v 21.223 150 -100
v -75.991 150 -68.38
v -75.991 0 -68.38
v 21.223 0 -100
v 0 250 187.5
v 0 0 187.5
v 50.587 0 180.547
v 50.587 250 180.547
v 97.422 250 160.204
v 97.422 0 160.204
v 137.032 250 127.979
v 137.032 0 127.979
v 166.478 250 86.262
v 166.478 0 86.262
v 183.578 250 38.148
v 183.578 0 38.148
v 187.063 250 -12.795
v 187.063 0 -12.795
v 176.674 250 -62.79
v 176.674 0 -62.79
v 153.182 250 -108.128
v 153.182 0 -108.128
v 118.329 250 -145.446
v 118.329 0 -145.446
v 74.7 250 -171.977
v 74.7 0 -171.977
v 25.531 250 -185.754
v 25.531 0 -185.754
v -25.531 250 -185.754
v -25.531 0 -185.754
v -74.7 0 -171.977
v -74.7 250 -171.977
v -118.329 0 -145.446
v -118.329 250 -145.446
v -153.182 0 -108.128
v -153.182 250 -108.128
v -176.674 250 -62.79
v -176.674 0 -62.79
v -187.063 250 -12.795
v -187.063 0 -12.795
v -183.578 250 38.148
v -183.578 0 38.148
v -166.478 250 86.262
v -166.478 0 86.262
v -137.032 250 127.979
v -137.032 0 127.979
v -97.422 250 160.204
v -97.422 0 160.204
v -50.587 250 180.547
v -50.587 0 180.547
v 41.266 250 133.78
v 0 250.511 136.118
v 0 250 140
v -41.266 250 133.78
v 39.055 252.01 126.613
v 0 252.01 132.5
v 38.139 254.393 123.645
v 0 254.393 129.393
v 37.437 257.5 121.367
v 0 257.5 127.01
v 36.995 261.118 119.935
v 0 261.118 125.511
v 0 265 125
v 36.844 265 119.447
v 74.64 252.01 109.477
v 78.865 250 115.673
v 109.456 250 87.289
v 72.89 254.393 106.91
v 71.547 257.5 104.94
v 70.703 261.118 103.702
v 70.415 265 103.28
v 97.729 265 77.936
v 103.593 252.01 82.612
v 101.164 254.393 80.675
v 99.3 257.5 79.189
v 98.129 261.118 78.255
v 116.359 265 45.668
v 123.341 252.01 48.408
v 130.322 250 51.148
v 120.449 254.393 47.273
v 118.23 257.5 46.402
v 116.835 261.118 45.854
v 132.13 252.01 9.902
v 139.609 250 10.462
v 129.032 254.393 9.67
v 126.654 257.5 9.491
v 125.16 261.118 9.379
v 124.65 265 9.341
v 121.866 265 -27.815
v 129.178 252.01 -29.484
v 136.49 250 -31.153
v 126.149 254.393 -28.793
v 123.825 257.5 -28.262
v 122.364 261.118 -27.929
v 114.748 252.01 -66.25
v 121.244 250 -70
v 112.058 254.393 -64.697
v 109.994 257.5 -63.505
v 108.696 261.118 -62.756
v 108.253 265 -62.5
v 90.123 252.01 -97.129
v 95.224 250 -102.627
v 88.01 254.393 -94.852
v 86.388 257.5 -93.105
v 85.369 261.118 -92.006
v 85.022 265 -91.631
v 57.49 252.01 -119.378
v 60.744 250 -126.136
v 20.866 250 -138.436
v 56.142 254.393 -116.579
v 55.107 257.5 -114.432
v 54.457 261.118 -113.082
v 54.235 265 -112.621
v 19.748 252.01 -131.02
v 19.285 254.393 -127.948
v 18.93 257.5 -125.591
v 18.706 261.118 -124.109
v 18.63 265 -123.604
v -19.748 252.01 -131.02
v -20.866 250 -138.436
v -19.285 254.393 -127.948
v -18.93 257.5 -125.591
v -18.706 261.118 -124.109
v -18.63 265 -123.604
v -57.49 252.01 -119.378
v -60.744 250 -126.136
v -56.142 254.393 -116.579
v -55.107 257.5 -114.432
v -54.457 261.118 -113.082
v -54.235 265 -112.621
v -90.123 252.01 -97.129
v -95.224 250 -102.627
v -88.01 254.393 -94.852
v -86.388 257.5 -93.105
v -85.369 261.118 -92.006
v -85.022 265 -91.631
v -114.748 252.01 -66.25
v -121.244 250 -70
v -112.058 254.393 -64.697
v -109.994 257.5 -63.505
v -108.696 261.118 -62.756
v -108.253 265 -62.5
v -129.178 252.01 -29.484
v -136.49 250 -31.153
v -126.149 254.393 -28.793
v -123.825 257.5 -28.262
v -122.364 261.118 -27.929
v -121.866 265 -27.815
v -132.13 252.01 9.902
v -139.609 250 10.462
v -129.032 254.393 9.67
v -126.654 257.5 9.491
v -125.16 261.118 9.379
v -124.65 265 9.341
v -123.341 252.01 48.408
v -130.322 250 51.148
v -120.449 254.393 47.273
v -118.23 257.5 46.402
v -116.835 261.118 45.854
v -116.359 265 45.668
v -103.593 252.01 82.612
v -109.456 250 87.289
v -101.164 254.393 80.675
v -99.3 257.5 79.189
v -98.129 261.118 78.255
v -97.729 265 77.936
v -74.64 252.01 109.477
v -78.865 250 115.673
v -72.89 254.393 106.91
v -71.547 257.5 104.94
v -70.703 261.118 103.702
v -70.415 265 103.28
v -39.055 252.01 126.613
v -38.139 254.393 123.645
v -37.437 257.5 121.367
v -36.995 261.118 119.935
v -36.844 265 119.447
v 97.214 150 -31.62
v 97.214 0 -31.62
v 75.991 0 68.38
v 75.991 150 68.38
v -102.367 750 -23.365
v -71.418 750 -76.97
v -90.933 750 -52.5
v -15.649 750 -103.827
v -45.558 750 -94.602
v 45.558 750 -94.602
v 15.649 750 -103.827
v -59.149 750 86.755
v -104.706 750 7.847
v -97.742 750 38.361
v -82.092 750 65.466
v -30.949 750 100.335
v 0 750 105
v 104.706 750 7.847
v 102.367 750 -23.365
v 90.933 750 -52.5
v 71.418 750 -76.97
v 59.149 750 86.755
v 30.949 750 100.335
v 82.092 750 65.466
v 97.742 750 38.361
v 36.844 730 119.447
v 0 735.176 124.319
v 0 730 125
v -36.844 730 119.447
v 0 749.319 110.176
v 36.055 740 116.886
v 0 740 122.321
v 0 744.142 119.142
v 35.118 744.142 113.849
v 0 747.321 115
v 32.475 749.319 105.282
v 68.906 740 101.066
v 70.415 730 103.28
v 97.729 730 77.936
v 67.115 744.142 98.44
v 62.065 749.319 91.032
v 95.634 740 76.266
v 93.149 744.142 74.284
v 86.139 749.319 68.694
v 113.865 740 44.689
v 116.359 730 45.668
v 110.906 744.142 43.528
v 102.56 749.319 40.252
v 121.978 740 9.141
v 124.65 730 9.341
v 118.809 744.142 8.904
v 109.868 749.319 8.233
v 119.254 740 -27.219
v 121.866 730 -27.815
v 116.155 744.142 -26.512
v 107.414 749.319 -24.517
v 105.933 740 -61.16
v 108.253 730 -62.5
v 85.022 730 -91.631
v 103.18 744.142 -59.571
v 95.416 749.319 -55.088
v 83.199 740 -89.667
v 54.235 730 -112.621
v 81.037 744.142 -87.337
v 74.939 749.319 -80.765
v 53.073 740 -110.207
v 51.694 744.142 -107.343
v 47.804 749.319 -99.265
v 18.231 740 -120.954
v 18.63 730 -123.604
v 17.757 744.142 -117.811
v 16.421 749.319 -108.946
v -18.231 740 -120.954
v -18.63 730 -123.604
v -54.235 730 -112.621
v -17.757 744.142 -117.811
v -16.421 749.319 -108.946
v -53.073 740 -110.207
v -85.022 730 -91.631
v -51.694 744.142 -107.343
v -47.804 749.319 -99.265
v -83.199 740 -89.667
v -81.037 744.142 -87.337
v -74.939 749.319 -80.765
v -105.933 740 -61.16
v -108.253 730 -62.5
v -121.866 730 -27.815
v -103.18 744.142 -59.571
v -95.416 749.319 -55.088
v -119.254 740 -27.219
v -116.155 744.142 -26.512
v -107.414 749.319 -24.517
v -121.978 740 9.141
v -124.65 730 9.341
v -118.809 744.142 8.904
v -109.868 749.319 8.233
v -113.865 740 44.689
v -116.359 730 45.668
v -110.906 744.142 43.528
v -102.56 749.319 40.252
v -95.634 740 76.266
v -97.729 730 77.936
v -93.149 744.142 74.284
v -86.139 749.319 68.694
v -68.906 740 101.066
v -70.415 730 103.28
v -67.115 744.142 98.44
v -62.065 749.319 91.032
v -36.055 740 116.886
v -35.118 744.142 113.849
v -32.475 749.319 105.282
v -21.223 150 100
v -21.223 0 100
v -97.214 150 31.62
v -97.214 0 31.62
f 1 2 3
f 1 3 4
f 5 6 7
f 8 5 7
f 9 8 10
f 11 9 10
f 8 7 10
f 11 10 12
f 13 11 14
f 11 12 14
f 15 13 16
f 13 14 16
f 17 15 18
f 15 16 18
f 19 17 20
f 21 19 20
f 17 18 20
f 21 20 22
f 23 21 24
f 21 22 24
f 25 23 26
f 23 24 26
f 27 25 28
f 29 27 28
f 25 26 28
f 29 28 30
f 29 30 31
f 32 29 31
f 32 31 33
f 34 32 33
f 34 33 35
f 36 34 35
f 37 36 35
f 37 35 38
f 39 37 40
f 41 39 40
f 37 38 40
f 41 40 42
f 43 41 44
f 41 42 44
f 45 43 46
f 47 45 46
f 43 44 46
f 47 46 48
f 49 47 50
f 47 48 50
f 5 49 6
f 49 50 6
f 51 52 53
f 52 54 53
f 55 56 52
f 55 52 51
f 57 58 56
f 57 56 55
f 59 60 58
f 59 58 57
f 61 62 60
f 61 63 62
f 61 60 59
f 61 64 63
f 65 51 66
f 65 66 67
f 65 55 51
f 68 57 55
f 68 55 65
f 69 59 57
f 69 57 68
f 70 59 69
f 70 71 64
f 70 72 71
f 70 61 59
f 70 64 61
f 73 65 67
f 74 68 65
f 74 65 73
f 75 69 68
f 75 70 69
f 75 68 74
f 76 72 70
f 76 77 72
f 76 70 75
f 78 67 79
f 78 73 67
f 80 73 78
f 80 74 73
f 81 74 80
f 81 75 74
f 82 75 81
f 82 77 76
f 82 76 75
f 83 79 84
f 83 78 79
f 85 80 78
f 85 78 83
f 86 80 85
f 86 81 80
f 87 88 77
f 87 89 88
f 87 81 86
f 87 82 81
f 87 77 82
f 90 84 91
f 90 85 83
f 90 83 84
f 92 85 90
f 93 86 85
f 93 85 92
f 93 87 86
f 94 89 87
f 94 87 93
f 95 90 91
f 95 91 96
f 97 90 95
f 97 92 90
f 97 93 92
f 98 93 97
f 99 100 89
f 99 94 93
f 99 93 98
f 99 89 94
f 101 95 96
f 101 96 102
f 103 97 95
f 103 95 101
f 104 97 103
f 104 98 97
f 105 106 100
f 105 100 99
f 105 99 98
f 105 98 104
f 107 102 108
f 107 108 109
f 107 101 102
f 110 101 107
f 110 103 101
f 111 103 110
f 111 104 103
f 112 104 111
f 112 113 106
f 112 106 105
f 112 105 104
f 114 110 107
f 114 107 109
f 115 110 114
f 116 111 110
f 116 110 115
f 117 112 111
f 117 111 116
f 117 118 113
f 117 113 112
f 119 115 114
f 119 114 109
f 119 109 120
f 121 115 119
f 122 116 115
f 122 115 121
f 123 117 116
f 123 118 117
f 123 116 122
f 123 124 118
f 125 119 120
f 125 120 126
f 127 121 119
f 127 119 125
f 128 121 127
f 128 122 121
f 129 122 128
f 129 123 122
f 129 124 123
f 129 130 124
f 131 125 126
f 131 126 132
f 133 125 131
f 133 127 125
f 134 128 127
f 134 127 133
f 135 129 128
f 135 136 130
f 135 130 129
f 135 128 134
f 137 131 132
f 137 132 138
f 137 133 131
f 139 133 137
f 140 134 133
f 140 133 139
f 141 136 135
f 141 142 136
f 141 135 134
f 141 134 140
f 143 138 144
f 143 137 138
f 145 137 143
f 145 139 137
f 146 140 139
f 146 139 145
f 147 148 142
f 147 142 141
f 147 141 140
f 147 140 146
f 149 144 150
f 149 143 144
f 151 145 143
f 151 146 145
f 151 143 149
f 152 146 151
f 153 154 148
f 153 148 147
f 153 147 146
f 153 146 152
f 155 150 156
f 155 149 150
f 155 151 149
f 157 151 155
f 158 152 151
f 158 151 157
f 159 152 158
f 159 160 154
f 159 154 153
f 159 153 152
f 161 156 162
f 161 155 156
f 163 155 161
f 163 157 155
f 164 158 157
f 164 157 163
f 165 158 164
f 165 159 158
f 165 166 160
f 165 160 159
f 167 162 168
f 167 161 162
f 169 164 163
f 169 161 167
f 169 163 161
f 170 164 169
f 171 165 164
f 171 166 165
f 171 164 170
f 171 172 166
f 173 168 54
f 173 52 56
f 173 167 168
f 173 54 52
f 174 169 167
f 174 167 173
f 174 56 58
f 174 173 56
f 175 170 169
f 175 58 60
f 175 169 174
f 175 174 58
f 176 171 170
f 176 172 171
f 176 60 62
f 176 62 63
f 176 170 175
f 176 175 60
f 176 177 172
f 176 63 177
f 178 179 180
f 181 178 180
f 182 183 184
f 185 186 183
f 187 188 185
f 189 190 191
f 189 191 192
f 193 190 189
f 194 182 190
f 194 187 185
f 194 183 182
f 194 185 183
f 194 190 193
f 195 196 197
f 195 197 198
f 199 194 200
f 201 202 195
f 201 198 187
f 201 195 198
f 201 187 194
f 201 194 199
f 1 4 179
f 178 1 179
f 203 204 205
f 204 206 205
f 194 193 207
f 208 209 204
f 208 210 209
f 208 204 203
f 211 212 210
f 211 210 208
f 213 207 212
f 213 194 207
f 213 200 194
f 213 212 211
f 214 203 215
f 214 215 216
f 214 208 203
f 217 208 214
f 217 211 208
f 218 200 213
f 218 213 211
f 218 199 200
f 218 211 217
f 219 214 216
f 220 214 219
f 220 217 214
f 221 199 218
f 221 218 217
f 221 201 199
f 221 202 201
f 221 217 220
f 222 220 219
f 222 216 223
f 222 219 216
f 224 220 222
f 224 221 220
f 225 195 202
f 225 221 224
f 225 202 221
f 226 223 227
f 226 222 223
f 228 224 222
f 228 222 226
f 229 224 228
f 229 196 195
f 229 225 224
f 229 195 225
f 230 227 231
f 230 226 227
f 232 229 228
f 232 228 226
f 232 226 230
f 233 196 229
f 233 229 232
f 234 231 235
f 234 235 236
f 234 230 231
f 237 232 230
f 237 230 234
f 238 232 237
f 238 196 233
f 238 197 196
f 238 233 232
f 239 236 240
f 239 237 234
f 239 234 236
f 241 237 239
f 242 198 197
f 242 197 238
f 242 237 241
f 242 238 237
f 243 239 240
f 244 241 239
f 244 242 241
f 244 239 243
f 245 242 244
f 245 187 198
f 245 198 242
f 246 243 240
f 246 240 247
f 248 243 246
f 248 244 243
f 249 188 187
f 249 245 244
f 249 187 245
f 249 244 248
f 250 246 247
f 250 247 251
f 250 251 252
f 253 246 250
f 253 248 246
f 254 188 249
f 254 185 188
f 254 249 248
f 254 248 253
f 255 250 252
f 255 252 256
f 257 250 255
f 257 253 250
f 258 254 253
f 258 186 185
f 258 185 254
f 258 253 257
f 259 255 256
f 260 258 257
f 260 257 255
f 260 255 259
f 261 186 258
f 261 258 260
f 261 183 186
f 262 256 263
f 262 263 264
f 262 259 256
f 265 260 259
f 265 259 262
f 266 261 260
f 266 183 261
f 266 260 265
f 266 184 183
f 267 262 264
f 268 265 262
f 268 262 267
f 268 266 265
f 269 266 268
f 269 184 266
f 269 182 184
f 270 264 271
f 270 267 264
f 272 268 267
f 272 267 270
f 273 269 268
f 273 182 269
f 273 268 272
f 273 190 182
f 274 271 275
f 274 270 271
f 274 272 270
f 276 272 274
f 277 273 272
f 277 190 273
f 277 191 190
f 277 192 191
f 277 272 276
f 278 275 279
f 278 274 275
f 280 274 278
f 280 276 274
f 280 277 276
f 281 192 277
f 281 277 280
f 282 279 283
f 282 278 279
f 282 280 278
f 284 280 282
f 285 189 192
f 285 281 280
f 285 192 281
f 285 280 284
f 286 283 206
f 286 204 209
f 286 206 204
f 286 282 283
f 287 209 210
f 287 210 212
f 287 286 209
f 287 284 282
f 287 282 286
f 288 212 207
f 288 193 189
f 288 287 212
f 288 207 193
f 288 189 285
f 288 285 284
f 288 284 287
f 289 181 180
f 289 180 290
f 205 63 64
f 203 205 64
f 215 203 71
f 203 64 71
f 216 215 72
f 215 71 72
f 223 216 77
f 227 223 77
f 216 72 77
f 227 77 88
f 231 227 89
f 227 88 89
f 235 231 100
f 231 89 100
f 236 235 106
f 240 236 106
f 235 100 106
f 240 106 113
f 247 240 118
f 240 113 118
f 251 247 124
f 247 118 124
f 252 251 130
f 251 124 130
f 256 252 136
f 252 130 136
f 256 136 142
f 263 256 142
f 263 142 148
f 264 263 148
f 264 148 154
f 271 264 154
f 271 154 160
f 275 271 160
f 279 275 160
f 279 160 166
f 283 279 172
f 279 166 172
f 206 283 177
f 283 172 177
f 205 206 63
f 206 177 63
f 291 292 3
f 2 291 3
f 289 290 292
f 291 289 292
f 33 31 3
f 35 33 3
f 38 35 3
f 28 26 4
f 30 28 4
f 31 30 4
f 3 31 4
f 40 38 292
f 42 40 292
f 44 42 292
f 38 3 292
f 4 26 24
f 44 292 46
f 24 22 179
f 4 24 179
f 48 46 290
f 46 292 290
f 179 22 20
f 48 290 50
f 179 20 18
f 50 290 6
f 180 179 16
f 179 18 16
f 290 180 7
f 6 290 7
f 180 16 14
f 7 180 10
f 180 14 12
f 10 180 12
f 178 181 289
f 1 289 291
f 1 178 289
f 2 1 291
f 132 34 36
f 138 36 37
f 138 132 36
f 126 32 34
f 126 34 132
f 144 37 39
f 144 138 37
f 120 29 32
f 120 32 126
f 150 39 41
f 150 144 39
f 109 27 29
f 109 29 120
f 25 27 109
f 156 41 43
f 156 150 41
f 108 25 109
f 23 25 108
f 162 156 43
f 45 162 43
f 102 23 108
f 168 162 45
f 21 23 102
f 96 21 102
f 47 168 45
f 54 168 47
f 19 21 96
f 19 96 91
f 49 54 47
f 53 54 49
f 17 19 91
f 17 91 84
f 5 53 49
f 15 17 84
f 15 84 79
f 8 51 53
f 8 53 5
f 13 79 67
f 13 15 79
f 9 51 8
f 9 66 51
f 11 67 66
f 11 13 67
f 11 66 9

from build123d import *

# Parameters (mm, degrees)
SKETCH1_R           = 187.5
BOSS_EXTRUDE1_DEPTH = 250
SKETCH2_R           = 125
BOSS_EXTRUDE2_DEPTH = 500
FILLET1_R           = 15
FILLET2_R           = 20
CUT_EXTRUDE1_DEPTH  = 150


with BuildPart() as part:
    # Sketch1 → Boss-Extrude1 (new body)
    with BuildSketch(Plane(origin=(0, 0, 0), x_dir=(1, 0, 0), z_dir=(0, 1, 0))):
        with Locations(Location((0, 0, 0), (0, 0, 270))):
            Circle(SKETCH1_R)
    extrude(amount=BOSS_EXTRUDE1_DEPTH)

    # Sketch2 → Boss-Extrude2 (add)
    with BuildSketch(Plane(origin=(0, 250, 0), x_dir=(1, 0, 0), z_dir=(0, 1, 0))):
        with Locations(Location((0, 0, 0), (0, 0, 270))):
            Circle(SKETCH2_R)
    extrude(amount=BOSS_EXTRUDE2_DEPTH)

    # Fillet1
    fillet1_edges = [part.edges().sort_by_distance(p)[0] for p in [
        (0, 250, -125),
    ]]
    fillet(fillet1_edges, radius=FILLET1_R)

    # Fillet2
    fillet2_edges = [part.edges().sort_by_distance(p)[0] for p in [
        (0, 750, -125),
    ]]
    fillet(fillet2_edges, radius=FILLET2_R)

    # Sketch3 → Cut-Extrude1 (cut)
    with BuildSketch(Plane(origin=(0, 0, 0), x_dir=(-1, 0, 0), z_dir=(0, -1, 0))):
        Polygon((97.214244703, -31.619988955), (75.990836054, 68.380011045), (-21.223408649, 100), (-97.214244703, 31.619988955), (-75.990836054, -68.380011045), (21.223408649, -100), align=None)
    extrude(amount=-CUT_EXTRUDE1_DEPTH, mode=Mode.SUBTRACT)


solid = part.part
